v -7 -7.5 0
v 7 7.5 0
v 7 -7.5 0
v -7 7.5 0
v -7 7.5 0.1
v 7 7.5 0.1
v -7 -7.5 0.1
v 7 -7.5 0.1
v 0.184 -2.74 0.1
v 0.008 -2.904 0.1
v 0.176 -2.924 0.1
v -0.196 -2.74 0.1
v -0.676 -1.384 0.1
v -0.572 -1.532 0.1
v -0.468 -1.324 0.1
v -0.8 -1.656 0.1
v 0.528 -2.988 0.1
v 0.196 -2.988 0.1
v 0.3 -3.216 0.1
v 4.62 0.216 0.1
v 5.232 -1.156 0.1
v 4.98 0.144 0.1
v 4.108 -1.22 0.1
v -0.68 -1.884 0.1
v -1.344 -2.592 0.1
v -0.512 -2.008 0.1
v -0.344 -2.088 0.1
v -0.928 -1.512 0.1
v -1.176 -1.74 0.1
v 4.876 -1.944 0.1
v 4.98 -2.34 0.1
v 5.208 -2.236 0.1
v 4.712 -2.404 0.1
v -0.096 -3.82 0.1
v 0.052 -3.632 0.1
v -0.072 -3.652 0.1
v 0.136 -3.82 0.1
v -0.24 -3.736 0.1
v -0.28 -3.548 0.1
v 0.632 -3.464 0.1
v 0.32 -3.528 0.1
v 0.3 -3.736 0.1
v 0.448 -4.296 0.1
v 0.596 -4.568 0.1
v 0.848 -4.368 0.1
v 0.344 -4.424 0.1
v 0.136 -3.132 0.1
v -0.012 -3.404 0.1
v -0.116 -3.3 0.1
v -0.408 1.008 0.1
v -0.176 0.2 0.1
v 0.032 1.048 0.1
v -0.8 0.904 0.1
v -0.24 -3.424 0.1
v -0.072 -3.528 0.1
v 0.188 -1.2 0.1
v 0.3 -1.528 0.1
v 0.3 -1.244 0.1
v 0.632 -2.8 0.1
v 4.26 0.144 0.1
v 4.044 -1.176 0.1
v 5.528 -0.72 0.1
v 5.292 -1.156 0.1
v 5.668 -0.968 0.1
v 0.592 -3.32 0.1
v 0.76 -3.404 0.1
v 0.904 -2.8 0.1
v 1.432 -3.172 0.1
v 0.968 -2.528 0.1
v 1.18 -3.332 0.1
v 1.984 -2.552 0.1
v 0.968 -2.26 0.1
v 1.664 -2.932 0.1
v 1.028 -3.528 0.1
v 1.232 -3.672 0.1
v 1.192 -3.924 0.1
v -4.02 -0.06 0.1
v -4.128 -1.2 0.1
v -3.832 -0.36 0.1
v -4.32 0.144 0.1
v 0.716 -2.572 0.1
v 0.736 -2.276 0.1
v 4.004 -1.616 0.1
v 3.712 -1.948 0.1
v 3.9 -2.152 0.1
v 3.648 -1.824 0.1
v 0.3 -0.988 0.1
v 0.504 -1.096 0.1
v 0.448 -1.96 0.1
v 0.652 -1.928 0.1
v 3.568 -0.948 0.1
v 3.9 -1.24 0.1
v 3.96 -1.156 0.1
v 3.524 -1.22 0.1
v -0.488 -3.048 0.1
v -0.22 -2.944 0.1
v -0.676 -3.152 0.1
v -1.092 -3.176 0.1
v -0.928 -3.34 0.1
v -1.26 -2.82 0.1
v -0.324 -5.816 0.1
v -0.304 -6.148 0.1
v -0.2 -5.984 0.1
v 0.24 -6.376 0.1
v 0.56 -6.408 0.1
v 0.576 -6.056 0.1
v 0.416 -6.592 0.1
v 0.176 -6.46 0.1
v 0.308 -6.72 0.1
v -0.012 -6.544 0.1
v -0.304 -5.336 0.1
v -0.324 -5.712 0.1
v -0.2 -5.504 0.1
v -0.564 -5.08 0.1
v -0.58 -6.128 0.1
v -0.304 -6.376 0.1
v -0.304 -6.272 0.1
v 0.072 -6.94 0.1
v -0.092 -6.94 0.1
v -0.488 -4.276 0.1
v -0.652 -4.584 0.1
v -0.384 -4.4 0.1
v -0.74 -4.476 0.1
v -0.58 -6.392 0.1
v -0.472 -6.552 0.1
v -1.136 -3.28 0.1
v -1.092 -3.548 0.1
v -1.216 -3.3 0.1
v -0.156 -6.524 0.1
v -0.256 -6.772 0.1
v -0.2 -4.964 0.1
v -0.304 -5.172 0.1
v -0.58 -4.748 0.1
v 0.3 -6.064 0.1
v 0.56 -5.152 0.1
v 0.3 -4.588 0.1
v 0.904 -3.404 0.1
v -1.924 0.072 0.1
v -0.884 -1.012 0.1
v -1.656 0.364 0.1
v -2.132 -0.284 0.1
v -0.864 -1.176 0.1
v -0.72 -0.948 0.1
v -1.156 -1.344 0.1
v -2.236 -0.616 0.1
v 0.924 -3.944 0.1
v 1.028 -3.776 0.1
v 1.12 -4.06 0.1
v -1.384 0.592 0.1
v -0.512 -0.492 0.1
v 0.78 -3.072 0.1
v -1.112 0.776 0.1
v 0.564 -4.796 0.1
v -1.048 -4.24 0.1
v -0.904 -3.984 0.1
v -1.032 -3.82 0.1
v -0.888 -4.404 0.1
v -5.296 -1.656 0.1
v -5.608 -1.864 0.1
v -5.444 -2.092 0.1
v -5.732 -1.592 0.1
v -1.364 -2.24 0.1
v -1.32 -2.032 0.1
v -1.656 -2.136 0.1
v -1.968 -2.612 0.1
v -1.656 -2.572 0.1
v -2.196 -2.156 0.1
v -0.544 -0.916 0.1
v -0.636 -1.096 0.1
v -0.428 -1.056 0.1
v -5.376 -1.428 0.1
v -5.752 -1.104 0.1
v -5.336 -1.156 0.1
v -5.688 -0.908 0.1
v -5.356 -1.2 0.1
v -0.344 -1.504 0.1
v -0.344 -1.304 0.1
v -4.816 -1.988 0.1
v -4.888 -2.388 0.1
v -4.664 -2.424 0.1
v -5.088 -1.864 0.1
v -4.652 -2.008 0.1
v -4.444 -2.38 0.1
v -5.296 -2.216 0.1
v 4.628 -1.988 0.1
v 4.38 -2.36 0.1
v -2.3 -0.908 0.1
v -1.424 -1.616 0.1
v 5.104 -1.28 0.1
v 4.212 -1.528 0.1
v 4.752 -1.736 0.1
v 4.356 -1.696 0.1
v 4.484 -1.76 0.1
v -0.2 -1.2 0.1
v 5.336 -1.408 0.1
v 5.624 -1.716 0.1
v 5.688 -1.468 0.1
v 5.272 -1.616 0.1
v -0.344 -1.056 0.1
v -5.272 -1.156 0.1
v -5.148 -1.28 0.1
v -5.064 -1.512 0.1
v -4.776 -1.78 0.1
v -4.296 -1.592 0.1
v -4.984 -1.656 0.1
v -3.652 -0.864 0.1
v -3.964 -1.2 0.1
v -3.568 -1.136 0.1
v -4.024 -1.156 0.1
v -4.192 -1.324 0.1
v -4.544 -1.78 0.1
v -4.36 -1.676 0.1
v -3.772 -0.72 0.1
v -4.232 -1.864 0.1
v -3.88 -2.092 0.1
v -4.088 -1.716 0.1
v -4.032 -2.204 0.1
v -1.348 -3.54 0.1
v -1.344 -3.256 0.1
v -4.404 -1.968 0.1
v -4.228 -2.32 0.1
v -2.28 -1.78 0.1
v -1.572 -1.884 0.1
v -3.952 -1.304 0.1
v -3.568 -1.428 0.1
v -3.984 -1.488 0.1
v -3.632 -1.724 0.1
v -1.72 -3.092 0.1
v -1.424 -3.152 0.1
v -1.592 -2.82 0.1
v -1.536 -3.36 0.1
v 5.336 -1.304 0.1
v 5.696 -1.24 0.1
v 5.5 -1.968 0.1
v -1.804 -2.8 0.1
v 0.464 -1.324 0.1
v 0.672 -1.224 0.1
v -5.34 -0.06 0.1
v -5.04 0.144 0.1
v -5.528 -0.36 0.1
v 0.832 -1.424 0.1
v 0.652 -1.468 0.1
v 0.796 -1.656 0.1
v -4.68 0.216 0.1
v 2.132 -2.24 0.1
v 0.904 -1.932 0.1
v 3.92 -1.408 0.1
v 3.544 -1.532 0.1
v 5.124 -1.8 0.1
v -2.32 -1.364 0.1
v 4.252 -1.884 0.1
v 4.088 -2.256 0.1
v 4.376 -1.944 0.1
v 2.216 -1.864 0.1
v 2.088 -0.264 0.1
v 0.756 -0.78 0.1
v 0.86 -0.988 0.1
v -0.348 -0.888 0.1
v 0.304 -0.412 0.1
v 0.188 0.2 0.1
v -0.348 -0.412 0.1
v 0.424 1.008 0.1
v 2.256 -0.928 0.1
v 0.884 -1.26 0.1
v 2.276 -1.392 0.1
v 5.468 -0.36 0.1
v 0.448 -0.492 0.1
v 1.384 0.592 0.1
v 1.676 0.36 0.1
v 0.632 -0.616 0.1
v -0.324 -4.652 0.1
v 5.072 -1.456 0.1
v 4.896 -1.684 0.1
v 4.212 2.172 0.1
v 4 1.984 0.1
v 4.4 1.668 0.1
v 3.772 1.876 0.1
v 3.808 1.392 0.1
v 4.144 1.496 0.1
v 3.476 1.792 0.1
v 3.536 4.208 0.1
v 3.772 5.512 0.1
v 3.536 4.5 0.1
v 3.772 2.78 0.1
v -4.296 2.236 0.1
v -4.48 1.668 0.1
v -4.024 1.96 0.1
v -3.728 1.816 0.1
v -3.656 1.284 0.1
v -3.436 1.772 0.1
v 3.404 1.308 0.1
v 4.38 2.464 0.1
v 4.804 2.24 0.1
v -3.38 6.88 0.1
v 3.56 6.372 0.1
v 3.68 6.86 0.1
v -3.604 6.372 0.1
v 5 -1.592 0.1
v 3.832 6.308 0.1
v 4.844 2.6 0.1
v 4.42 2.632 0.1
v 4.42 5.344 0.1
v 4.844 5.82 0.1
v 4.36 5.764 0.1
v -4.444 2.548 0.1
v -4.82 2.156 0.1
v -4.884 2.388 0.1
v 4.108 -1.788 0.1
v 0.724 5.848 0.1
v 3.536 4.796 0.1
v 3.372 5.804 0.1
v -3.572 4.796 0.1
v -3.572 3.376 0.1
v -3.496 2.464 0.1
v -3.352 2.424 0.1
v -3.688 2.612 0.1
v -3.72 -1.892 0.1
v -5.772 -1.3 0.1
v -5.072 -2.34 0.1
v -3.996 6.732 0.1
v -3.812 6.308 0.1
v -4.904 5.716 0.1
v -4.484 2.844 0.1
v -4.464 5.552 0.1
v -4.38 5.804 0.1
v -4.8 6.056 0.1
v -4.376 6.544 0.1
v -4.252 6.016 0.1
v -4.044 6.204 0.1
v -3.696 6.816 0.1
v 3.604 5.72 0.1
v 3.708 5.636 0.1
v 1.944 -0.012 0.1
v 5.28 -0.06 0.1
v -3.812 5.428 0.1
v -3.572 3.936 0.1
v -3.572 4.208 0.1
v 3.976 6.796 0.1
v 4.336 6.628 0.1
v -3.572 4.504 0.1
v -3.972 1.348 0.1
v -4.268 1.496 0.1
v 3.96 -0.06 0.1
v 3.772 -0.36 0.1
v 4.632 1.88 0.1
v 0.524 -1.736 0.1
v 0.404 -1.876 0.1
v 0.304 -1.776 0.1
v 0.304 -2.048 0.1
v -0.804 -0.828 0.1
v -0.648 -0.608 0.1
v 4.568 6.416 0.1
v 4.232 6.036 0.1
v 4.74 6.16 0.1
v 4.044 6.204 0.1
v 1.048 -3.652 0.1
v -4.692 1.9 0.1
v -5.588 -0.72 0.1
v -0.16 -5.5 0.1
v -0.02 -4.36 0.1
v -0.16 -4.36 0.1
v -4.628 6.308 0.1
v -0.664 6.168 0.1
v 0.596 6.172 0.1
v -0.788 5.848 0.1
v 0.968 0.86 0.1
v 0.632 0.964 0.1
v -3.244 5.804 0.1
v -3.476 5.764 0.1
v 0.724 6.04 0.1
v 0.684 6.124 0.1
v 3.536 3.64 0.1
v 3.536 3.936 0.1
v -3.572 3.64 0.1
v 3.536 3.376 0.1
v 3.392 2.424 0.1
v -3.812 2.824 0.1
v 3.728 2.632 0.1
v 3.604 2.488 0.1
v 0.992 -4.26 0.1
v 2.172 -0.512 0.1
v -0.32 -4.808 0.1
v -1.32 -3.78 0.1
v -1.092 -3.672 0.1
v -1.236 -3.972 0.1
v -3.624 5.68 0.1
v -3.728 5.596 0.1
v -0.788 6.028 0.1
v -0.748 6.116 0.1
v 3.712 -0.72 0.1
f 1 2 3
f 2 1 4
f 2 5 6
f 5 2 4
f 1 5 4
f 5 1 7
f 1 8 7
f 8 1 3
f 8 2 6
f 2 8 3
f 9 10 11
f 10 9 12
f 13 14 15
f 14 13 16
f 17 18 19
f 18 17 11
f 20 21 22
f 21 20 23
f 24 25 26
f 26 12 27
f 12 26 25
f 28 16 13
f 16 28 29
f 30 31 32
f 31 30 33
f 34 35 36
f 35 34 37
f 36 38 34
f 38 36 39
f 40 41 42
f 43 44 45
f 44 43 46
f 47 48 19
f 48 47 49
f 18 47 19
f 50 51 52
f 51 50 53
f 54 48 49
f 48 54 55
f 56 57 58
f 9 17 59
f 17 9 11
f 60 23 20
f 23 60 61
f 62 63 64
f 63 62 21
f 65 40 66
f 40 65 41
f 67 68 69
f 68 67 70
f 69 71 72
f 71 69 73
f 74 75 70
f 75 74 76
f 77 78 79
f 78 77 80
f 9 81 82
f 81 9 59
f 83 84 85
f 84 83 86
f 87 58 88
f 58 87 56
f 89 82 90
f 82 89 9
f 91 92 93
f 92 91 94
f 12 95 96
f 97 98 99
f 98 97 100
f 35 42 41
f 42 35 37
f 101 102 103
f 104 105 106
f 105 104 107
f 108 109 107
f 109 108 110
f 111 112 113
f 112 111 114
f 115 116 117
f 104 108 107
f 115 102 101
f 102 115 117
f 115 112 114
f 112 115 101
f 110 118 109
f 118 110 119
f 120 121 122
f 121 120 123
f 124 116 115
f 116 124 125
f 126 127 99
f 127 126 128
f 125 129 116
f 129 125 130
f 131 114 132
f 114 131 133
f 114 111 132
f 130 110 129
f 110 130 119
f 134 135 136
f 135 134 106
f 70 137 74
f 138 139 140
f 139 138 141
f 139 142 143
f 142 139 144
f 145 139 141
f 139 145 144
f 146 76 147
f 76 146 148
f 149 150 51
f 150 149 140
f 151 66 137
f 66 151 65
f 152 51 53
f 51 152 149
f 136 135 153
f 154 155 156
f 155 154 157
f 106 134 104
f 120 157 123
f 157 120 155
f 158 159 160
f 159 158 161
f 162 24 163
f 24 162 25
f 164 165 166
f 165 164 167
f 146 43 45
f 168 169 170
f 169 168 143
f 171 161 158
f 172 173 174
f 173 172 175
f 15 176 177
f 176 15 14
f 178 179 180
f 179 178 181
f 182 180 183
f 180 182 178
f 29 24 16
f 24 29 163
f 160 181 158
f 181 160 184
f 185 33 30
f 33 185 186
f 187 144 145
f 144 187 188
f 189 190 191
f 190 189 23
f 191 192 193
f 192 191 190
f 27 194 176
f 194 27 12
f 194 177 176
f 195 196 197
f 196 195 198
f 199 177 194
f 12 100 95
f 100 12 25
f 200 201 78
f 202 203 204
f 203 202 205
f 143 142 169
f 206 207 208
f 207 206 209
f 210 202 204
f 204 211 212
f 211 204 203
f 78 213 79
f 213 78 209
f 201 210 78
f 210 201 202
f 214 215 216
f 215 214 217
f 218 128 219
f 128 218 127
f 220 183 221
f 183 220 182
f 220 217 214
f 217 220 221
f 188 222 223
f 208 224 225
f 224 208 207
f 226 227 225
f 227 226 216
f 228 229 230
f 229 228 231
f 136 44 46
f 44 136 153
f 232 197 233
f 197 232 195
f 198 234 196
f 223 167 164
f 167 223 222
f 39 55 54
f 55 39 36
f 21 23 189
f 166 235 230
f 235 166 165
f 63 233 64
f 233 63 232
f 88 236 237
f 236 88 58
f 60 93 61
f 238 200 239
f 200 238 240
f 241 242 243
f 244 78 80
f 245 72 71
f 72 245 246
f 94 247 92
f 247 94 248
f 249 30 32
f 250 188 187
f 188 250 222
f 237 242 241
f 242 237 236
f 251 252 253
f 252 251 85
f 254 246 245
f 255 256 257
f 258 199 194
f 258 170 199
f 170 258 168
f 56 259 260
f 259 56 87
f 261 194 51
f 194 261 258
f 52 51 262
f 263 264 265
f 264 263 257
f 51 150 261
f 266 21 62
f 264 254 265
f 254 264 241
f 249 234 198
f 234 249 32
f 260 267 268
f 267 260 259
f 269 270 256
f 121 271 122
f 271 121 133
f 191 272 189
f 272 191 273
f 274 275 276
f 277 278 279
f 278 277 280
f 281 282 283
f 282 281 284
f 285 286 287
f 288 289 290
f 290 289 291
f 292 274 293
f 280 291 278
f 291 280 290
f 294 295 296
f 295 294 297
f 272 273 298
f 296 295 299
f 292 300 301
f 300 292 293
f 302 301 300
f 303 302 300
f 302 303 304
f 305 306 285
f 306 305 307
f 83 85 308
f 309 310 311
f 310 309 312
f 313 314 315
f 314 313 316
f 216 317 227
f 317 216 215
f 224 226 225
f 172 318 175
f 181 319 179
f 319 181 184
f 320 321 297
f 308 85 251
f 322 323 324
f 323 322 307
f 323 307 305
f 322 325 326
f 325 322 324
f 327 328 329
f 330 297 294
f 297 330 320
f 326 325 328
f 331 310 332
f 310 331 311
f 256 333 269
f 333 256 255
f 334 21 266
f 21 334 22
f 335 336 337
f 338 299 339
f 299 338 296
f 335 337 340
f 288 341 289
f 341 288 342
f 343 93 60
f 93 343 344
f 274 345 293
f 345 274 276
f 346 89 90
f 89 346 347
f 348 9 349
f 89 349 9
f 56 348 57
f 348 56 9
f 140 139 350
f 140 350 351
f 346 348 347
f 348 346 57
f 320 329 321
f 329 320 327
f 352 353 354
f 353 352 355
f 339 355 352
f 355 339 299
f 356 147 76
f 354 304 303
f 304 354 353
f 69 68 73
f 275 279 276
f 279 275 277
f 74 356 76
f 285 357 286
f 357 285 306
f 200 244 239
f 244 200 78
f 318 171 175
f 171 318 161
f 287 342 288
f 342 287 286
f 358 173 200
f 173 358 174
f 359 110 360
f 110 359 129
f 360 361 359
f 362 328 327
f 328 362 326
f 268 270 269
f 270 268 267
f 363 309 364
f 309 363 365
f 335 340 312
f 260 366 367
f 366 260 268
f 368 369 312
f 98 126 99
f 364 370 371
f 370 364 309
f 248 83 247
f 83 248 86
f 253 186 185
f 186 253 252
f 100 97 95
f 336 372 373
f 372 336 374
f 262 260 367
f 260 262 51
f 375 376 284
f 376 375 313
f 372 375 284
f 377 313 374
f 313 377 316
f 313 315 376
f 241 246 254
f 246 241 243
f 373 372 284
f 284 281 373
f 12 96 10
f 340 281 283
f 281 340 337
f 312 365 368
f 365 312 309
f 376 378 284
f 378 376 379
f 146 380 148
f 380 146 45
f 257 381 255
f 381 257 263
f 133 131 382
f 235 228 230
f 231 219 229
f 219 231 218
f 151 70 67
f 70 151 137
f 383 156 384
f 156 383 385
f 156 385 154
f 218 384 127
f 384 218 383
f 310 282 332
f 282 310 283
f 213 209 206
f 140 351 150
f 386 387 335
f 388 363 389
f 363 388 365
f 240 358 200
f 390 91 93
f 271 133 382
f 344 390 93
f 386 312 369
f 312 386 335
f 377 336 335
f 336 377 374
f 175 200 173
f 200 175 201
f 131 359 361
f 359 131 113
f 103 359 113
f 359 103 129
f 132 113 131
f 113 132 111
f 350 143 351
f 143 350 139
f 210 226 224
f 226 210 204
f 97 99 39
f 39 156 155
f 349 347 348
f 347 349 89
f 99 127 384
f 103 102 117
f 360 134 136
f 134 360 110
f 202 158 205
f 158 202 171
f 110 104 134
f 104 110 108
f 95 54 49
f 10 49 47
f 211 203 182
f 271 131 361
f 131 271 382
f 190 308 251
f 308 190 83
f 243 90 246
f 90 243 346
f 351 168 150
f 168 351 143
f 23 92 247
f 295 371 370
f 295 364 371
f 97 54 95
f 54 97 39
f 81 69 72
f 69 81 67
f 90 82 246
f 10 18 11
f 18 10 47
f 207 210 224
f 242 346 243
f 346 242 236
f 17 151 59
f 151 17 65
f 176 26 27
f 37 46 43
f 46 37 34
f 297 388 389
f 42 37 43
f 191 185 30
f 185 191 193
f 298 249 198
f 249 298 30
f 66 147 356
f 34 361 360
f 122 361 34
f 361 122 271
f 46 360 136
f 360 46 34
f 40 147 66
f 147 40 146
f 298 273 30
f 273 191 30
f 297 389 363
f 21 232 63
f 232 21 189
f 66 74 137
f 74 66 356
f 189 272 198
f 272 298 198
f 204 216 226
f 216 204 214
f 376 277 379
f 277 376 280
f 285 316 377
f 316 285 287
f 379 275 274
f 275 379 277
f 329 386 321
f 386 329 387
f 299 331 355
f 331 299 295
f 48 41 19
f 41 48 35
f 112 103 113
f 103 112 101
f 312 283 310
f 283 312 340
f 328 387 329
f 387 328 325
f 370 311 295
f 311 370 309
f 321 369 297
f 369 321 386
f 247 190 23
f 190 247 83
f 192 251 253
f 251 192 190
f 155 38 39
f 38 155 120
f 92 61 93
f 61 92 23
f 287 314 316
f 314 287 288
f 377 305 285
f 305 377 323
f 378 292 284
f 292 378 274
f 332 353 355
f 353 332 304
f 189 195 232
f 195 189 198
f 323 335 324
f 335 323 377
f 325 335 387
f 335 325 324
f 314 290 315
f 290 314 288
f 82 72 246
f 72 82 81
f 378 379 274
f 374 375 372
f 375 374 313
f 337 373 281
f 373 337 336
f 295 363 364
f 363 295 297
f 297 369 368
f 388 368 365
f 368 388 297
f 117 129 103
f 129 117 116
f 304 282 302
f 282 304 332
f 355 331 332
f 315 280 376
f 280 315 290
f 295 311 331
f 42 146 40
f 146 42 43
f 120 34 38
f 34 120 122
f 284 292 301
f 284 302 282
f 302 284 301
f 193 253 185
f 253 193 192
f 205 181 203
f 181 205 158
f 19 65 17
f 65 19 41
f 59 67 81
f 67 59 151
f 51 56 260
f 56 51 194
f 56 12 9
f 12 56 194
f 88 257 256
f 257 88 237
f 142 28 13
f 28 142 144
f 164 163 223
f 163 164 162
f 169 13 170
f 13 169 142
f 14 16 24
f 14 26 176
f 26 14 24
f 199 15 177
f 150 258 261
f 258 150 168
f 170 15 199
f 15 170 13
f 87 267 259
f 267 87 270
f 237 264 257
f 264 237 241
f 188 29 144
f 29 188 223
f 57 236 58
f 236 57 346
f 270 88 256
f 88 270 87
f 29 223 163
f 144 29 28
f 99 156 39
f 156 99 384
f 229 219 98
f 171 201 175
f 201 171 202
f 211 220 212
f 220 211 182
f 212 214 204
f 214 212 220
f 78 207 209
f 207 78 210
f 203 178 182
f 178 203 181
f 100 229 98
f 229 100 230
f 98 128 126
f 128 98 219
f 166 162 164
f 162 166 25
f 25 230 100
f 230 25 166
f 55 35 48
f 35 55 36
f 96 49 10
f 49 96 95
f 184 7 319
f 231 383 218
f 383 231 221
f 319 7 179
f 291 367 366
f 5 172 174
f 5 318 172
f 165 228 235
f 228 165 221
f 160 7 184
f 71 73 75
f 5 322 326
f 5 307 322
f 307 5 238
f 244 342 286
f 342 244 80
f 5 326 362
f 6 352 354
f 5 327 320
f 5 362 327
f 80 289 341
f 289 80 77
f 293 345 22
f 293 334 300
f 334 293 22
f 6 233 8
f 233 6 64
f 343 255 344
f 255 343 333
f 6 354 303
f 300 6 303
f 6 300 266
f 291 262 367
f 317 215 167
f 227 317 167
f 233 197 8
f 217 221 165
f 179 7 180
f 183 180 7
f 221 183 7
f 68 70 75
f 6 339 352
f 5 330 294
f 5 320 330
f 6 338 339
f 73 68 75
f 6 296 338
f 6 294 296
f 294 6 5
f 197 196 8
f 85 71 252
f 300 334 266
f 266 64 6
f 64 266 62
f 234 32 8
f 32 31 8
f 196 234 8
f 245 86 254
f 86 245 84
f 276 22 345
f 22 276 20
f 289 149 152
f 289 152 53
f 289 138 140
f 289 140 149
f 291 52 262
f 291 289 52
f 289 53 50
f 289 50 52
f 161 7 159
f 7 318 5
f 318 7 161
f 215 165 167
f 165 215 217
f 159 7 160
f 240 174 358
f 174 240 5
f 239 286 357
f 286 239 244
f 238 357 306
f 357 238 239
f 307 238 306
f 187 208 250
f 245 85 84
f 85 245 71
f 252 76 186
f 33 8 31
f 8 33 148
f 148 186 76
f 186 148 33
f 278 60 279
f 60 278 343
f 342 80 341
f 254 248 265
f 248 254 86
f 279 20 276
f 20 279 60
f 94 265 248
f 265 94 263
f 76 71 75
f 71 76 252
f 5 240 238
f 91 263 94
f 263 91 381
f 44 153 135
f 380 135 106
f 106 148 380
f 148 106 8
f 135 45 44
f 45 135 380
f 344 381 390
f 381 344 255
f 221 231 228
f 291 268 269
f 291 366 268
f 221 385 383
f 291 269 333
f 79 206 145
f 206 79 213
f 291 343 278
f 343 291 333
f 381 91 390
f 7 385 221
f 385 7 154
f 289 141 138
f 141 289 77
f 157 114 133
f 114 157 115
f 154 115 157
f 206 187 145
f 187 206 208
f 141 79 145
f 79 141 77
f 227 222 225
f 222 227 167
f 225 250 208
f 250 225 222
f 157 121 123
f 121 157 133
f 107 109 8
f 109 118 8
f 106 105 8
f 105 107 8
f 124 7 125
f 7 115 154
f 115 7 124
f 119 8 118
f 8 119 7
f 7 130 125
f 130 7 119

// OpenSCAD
use <../lib.scad>
use <../p/box5-12.scad>
use <s/6296256ds01.scad>
function ldraw_lib__6296256d() = [
// 0 Sticker  1.9 x  1.8 with Ignition Key, Switches and Ashtray on Bright Light Yellow
// 0 Name: 6296256d.dat
// 0 Author: Magnus Forsberg [MagFors]
// 0 !LDRAW_ORG Part UPDATE 2024-05
// 0 !LICENSE Licensed under CC BY 4.0 : see CAreadme.txt
// 
// 0 BFC CERTIFY CCW
  [0,"BFC","CERTIFY"],
  [0,"BFC","CCW"],
// 
// 0 !KEYWORDS 500, Bricklink 10271stk01, Brickowl 815806, Cinquecento, FIAT, Nuova
// 0 !KEYWORDS Rebrickable 67343, set 10271
// 
// 0 !HISTORY 2020-12-29 [PTadmin] Official Update 2020-03
// 0 !HISTORY 2021-09-11 [MagFors] Subfiled for blue version
// 0 !HISTORY 2024-06-30 [OrionP] Official Update 2024-05
// 
// 
// 1 16 0 -.25 0 17.5 0 0 0 .25 0 0 0 18.75 box5-12.dat
  [1,16,0,-.25,0,17.5,0,0,0,.25,0,0,0,18.75, ldraw_lib__box5_12()],
// 1 226 0 0 0 1 0 0 0 1 0 0 0 1 s\6296256ds01.dat
  [1,226,0,0,0,1,0,0,0,1,0,0,0,1, ldraw_lib__s__6296256ds01()],
];
module ldraw_lib__6296256d(step=0, col=false, unit=2/5, alt=false, line=0.2, solid=!$preview)
    makepoly(ldraw_lib__6296256d(), step=step, col=col, unit=unit, alt=alt, line=line, solid=solid);
ldraw_lib__6296256d(line=0.2);
